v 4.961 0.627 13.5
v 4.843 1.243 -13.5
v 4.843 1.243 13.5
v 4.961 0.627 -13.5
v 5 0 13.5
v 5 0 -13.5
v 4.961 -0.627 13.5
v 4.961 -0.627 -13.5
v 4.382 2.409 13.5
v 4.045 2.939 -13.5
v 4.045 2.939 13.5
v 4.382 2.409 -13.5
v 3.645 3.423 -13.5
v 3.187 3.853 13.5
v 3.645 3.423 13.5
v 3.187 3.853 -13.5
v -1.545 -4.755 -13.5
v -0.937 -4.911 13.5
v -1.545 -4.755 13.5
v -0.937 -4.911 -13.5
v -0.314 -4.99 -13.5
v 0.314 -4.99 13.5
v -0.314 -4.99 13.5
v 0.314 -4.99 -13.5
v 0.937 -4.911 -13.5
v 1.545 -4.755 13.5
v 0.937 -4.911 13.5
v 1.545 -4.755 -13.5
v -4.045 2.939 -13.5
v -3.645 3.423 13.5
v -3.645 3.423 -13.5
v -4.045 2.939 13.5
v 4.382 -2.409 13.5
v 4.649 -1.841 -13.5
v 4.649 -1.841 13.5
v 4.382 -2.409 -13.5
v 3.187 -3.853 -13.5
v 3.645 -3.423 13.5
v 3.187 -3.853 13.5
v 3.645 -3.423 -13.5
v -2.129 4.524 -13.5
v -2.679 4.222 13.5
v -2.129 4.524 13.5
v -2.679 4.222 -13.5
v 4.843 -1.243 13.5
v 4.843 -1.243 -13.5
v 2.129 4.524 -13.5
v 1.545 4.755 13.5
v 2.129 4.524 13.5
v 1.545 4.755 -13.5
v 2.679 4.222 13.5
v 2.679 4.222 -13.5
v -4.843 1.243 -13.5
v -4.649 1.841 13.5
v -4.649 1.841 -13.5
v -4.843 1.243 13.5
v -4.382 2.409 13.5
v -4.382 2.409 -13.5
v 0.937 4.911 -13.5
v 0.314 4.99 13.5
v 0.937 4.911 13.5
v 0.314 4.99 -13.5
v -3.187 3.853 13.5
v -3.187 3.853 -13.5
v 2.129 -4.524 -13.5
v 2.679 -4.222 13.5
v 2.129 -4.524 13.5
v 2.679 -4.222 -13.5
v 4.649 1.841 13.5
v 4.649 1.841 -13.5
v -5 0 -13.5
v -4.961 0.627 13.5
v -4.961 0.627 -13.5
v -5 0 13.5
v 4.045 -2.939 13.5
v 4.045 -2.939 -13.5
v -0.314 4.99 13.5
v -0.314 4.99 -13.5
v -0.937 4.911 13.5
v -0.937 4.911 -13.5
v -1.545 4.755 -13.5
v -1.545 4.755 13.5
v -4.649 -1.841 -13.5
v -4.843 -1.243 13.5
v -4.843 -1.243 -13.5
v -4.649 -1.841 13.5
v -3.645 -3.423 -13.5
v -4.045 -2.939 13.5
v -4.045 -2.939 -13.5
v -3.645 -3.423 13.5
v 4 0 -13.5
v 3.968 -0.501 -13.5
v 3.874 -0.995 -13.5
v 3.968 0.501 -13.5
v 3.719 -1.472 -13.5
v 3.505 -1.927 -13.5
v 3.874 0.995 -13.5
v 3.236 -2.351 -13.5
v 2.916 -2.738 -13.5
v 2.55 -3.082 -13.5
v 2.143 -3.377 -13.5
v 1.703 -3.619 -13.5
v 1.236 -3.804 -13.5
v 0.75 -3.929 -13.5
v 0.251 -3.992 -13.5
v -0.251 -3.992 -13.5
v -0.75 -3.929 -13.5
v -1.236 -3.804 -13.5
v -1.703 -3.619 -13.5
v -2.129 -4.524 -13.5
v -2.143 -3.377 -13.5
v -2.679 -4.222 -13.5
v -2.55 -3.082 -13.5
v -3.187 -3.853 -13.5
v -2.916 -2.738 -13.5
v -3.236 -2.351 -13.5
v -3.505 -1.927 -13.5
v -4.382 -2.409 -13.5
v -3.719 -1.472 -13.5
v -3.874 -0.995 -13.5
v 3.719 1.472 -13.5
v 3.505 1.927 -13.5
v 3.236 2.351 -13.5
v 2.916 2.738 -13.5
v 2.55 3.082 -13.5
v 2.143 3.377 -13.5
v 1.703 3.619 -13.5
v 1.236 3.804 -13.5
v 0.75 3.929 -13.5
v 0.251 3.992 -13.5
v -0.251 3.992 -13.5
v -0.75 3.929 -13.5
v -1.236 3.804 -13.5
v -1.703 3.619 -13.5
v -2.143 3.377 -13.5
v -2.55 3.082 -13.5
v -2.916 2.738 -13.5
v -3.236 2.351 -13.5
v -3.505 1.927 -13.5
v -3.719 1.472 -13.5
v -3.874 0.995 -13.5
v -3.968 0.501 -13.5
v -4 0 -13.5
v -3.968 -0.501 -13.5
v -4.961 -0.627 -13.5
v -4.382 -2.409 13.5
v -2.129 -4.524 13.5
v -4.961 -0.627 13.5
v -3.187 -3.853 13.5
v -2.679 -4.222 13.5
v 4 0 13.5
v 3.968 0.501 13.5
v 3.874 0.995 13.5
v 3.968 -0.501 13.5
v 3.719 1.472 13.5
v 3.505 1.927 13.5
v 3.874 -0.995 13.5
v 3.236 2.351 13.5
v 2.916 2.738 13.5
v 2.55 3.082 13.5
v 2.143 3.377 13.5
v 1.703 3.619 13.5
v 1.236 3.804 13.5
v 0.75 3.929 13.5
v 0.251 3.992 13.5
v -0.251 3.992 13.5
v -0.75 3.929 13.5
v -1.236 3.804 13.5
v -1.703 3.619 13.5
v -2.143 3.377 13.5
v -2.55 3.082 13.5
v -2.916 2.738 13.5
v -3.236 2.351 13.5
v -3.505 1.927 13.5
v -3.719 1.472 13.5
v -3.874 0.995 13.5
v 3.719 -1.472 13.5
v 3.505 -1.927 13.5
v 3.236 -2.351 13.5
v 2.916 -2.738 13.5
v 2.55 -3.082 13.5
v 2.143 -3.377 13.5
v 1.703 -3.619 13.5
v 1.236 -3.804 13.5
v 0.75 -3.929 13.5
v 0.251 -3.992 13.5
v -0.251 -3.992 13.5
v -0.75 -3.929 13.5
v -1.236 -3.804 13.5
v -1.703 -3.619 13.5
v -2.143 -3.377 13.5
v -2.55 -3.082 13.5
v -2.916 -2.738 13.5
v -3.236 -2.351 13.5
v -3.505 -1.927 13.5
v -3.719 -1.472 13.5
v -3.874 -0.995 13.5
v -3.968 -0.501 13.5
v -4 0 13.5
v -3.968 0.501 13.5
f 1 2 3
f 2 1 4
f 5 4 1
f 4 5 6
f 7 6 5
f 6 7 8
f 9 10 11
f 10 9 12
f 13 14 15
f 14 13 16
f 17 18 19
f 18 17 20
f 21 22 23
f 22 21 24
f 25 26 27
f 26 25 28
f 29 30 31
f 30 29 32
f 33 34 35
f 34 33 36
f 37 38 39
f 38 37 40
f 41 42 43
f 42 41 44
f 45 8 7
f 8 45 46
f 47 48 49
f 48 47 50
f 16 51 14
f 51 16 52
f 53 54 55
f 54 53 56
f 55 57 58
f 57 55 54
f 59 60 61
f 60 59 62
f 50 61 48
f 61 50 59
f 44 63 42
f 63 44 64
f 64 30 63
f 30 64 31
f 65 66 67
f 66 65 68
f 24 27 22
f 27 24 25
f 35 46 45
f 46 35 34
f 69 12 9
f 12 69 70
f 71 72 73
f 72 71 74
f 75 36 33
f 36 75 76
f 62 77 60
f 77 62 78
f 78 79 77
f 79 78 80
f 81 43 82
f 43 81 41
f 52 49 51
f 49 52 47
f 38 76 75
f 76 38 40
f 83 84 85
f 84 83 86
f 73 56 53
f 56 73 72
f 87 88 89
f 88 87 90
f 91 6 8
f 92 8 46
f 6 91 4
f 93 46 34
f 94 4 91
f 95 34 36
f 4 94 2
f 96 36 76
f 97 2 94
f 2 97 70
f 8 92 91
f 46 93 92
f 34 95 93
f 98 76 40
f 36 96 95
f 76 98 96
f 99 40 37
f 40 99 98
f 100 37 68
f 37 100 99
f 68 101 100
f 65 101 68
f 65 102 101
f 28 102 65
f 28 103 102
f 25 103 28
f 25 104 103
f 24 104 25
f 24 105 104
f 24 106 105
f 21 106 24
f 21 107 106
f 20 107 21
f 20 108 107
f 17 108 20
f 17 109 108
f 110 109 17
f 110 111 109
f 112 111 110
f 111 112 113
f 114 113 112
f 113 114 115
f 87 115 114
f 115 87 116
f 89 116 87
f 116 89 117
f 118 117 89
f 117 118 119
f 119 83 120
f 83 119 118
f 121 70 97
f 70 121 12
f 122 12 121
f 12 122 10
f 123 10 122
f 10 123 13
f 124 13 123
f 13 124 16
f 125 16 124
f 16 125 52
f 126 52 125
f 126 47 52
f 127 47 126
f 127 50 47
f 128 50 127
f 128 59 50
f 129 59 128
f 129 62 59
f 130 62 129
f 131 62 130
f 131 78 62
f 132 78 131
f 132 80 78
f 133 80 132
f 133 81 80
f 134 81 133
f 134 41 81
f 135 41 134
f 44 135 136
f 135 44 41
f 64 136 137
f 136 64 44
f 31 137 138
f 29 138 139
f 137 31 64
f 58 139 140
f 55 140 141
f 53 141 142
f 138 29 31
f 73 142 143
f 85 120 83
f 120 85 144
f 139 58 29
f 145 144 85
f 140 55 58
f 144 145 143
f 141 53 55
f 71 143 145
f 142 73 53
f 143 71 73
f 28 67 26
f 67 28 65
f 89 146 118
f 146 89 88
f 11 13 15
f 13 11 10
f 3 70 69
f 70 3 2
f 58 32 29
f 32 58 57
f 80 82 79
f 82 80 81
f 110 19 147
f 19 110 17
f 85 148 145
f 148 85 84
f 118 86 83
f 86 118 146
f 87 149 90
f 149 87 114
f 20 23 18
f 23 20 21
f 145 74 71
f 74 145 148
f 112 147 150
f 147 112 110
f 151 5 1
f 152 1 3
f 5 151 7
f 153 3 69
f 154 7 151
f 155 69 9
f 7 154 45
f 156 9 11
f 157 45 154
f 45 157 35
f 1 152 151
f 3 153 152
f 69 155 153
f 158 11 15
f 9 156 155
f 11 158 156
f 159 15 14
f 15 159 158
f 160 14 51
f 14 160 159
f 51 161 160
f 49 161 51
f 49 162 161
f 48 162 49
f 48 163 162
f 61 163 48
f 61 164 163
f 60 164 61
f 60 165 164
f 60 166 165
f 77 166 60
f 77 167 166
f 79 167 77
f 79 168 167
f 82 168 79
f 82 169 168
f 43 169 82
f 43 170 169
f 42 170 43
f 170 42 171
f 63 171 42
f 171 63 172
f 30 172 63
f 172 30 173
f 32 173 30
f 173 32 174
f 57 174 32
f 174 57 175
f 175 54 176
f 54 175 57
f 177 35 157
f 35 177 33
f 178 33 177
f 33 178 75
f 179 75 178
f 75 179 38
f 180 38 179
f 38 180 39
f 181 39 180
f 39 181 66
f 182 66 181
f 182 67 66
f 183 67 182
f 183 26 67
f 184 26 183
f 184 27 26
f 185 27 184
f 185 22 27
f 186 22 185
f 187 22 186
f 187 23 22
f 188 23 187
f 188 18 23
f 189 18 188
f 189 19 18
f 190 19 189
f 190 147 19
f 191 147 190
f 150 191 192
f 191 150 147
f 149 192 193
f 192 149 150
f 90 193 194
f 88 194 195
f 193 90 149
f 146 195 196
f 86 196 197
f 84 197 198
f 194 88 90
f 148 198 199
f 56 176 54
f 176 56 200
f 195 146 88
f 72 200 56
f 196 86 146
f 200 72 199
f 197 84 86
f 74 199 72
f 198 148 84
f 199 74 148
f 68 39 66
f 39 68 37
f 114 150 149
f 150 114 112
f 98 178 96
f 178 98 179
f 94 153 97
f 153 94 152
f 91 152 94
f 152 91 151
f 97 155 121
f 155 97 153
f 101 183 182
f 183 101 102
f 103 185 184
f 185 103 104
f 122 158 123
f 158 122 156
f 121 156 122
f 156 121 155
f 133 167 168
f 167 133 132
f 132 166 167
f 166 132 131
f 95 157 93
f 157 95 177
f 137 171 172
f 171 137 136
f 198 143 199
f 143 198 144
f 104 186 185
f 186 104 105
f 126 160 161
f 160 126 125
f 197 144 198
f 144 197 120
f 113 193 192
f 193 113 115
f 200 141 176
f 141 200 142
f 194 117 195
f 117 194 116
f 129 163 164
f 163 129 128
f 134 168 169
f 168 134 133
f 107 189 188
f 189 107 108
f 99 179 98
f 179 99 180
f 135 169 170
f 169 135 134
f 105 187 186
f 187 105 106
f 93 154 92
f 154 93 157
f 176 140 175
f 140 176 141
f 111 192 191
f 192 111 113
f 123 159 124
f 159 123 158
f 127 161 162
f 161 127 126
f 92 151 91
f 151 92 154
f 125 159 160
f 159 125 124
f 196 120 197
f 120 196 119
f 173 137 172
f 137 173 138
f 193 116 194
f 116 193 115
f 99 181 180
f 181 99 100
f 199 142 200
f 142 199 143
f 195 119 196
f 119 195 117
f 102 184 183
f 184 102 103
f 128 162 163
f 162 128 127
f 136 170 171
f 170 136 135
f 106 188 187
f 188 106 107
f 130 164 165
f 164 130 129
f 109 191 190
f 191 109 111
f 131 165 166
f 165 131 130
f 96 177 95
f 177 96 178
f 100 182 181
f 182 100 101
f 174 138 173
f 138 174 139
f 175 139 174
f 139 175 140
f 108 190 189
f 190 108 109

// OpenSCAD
$fn = 50;


difference() {
	union() {
		translate(v = [0, 0, -13.5000000000]) {
			cylinder(h = 27, r = 5.0000000000);
		}
	}
	union() {
		translate(v = [0, 0, -100.0000000000]) {
			cylinder(h = 200, r = 4.0000000000);
		}
	}
}
